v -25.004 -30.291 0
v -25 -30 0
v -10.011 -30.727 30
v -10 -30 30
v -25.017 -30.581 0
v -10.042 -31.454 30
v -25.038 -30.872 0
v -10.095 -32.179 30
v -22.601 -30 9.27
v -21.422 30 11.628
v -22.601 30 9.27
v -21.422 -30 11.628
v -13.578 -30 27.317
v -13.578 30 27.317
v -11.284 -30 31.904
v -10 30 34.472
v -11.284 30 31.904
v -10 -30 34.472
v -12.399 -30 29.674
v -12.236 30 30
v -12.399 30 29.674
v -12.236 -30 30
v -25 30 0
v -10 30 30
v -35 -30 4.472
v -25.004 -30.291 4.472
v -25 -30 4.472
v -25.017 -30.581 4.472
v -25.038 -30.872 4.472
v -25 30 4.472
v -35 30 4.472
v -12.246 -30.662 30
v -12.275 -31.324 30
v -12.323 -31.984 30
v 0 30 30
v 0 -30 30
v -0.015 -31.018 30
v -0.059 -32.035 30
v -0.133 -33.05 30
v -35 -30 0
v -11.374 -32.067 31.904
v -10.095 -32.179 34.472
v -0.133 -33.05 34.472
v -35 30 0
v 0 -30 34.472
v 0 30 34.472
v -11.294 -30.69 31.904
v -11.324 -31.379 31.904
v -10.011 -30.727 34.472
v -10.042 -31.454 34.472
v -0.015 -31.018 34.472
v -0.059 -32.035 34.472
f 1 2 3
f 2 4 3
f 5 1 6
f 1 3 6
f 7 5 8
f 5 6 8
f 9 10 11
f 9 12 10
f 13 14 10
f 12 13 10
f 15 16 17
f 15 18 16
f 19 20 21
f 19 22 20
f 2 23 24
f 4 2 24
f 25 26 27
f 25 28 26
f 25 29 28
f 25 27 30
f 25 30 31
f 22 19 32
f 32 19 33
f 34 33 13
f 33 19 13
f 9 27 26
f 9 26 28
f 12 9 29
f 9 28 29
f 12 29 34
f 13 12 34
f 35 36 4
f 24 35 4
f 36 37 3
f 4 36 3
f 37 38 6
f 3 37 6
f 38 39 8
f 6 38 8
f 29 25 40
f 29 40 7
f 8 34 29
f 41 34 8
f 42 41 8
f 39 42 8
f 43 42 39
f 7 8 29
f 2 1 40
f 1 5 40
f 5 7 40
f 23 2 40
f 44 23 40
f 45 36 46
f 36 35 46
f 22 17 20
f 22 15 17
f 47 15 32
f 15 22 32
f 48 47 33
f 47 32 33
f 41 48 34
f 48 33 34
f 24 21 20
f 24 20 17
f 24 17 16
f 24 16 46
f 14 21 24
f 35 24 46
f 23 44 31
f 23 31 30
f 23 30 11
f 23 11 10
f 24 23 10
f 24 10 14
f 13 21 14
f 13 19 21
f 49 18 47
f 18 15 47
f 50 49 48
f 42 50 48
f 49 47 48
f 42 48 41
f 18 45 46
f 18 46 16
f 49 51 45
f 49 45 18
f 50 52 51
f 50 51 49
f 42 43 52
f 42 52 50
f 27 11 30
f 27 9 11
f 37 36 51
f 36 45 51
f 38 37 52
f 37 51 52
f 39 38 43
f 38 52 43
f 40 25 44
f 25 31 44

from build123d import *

# Parameters (mm, degrees)
F2_W     = 10
F2_H     = 4.472136
F3_W     = 10
F3_H     = 4.472136
F4_W     = 10
F4_H     = 4.472136
F8_ANGLE = -5


with BuildPart() as f5:
    # F4 (on offset) → F5 section 0
    with BuildSketch(Plane.XZ.offset(-30)):
        Polygon((-10, 30), (-10, 34.472136), (-13.577709, 27.316718), (-21.422291, 11.627553), (-25, 4.472136), (-25, 0), align=None)
    # F3 (on Front) → F5 section 1
    with BuildSketch(Plane.XZ):
        Polygon((-10, 30), (-10, 34.472136), (-12.398913, 29.674309), (-13.577709, 27.316718), (-21.422291, 11.627553), (-22.601087, 9.269963), (-25, 4.472136), (-25, 0), align=None)
    # F2 (on offset) → F5 section 2
    with BuildSketch(Plane.XZ.offset(30)):
        Polygon((-10, 30), (-10, 34.472136), (-11.284195, 31.903745), (-12.236068, 30), (-22.763932, 8.944272), (-23.715805, 7.040526), (-25, 4.472136), (-25, 0), align=None)
    loft()

    # F2 (on offset) → F6 section 0
    with BuildSketch(Plane.XZ.offset(30)):
        with Locations((-5, 32.236068)):
            Rectangle(F2_W, F2_H)
    # F3 (on Front) → F6 section 1
    with BuildSketch(Plane.XZ):
        with Locations((-5, 32.236068)):
            Rectangle(F3_W, F3_H)
    # F4 (on offset) → F6 section 2
    with BuildSketch(Plane.XZ.offset(-30)):
        with Locations((-5, 32.236068)):
            Rectangle(F4_W, F4_H)
    loft()

    # F2 (on offset) → F7 section 0
    with BuildSketch(Plane.XZ.offset(30)):
        with Locations((-30, 2.236068)):
            Rectangle(F2_W, F2_H)
    # F3 (on Front) → F7 section 1
    with BuildSketch(Plane.XZ):
        with Locations((-30, 2.236068)):
            Rectangle(F3_W, F3_H)
    # F4 (on offset) → F7 section 2
    with BuildSketch(Plane.XZ.offset(-30)):
        with Locations((-30, 2.236068)):
            Rectangle(F4_W, F4_H)
    loft()

    # F2 (on offset) → F8 (revolve)
    with BuildSketch(Plane.XZ.offset(30)):
        Polygon((-10, 30), (-10, 34.472136), (-11.284195, 31.903745), (-12.236068, 30), (-22.763932, 8.944272), (-23.715805, 7.040526), (-25, 4.472136), (-25, 0), align=None)
        with Locations((-5, 32.236068)):
            Rectangle(F2_W, F2_H)
        with Locations((-30, 2.236068)):
            Rectangle(F2_W, F2_H)
    revolve(axis=Axis((-35, -30, 2.236068), (0, 0, 1)), revolution_arc=F8_ANGLE)


solid = f5.part
